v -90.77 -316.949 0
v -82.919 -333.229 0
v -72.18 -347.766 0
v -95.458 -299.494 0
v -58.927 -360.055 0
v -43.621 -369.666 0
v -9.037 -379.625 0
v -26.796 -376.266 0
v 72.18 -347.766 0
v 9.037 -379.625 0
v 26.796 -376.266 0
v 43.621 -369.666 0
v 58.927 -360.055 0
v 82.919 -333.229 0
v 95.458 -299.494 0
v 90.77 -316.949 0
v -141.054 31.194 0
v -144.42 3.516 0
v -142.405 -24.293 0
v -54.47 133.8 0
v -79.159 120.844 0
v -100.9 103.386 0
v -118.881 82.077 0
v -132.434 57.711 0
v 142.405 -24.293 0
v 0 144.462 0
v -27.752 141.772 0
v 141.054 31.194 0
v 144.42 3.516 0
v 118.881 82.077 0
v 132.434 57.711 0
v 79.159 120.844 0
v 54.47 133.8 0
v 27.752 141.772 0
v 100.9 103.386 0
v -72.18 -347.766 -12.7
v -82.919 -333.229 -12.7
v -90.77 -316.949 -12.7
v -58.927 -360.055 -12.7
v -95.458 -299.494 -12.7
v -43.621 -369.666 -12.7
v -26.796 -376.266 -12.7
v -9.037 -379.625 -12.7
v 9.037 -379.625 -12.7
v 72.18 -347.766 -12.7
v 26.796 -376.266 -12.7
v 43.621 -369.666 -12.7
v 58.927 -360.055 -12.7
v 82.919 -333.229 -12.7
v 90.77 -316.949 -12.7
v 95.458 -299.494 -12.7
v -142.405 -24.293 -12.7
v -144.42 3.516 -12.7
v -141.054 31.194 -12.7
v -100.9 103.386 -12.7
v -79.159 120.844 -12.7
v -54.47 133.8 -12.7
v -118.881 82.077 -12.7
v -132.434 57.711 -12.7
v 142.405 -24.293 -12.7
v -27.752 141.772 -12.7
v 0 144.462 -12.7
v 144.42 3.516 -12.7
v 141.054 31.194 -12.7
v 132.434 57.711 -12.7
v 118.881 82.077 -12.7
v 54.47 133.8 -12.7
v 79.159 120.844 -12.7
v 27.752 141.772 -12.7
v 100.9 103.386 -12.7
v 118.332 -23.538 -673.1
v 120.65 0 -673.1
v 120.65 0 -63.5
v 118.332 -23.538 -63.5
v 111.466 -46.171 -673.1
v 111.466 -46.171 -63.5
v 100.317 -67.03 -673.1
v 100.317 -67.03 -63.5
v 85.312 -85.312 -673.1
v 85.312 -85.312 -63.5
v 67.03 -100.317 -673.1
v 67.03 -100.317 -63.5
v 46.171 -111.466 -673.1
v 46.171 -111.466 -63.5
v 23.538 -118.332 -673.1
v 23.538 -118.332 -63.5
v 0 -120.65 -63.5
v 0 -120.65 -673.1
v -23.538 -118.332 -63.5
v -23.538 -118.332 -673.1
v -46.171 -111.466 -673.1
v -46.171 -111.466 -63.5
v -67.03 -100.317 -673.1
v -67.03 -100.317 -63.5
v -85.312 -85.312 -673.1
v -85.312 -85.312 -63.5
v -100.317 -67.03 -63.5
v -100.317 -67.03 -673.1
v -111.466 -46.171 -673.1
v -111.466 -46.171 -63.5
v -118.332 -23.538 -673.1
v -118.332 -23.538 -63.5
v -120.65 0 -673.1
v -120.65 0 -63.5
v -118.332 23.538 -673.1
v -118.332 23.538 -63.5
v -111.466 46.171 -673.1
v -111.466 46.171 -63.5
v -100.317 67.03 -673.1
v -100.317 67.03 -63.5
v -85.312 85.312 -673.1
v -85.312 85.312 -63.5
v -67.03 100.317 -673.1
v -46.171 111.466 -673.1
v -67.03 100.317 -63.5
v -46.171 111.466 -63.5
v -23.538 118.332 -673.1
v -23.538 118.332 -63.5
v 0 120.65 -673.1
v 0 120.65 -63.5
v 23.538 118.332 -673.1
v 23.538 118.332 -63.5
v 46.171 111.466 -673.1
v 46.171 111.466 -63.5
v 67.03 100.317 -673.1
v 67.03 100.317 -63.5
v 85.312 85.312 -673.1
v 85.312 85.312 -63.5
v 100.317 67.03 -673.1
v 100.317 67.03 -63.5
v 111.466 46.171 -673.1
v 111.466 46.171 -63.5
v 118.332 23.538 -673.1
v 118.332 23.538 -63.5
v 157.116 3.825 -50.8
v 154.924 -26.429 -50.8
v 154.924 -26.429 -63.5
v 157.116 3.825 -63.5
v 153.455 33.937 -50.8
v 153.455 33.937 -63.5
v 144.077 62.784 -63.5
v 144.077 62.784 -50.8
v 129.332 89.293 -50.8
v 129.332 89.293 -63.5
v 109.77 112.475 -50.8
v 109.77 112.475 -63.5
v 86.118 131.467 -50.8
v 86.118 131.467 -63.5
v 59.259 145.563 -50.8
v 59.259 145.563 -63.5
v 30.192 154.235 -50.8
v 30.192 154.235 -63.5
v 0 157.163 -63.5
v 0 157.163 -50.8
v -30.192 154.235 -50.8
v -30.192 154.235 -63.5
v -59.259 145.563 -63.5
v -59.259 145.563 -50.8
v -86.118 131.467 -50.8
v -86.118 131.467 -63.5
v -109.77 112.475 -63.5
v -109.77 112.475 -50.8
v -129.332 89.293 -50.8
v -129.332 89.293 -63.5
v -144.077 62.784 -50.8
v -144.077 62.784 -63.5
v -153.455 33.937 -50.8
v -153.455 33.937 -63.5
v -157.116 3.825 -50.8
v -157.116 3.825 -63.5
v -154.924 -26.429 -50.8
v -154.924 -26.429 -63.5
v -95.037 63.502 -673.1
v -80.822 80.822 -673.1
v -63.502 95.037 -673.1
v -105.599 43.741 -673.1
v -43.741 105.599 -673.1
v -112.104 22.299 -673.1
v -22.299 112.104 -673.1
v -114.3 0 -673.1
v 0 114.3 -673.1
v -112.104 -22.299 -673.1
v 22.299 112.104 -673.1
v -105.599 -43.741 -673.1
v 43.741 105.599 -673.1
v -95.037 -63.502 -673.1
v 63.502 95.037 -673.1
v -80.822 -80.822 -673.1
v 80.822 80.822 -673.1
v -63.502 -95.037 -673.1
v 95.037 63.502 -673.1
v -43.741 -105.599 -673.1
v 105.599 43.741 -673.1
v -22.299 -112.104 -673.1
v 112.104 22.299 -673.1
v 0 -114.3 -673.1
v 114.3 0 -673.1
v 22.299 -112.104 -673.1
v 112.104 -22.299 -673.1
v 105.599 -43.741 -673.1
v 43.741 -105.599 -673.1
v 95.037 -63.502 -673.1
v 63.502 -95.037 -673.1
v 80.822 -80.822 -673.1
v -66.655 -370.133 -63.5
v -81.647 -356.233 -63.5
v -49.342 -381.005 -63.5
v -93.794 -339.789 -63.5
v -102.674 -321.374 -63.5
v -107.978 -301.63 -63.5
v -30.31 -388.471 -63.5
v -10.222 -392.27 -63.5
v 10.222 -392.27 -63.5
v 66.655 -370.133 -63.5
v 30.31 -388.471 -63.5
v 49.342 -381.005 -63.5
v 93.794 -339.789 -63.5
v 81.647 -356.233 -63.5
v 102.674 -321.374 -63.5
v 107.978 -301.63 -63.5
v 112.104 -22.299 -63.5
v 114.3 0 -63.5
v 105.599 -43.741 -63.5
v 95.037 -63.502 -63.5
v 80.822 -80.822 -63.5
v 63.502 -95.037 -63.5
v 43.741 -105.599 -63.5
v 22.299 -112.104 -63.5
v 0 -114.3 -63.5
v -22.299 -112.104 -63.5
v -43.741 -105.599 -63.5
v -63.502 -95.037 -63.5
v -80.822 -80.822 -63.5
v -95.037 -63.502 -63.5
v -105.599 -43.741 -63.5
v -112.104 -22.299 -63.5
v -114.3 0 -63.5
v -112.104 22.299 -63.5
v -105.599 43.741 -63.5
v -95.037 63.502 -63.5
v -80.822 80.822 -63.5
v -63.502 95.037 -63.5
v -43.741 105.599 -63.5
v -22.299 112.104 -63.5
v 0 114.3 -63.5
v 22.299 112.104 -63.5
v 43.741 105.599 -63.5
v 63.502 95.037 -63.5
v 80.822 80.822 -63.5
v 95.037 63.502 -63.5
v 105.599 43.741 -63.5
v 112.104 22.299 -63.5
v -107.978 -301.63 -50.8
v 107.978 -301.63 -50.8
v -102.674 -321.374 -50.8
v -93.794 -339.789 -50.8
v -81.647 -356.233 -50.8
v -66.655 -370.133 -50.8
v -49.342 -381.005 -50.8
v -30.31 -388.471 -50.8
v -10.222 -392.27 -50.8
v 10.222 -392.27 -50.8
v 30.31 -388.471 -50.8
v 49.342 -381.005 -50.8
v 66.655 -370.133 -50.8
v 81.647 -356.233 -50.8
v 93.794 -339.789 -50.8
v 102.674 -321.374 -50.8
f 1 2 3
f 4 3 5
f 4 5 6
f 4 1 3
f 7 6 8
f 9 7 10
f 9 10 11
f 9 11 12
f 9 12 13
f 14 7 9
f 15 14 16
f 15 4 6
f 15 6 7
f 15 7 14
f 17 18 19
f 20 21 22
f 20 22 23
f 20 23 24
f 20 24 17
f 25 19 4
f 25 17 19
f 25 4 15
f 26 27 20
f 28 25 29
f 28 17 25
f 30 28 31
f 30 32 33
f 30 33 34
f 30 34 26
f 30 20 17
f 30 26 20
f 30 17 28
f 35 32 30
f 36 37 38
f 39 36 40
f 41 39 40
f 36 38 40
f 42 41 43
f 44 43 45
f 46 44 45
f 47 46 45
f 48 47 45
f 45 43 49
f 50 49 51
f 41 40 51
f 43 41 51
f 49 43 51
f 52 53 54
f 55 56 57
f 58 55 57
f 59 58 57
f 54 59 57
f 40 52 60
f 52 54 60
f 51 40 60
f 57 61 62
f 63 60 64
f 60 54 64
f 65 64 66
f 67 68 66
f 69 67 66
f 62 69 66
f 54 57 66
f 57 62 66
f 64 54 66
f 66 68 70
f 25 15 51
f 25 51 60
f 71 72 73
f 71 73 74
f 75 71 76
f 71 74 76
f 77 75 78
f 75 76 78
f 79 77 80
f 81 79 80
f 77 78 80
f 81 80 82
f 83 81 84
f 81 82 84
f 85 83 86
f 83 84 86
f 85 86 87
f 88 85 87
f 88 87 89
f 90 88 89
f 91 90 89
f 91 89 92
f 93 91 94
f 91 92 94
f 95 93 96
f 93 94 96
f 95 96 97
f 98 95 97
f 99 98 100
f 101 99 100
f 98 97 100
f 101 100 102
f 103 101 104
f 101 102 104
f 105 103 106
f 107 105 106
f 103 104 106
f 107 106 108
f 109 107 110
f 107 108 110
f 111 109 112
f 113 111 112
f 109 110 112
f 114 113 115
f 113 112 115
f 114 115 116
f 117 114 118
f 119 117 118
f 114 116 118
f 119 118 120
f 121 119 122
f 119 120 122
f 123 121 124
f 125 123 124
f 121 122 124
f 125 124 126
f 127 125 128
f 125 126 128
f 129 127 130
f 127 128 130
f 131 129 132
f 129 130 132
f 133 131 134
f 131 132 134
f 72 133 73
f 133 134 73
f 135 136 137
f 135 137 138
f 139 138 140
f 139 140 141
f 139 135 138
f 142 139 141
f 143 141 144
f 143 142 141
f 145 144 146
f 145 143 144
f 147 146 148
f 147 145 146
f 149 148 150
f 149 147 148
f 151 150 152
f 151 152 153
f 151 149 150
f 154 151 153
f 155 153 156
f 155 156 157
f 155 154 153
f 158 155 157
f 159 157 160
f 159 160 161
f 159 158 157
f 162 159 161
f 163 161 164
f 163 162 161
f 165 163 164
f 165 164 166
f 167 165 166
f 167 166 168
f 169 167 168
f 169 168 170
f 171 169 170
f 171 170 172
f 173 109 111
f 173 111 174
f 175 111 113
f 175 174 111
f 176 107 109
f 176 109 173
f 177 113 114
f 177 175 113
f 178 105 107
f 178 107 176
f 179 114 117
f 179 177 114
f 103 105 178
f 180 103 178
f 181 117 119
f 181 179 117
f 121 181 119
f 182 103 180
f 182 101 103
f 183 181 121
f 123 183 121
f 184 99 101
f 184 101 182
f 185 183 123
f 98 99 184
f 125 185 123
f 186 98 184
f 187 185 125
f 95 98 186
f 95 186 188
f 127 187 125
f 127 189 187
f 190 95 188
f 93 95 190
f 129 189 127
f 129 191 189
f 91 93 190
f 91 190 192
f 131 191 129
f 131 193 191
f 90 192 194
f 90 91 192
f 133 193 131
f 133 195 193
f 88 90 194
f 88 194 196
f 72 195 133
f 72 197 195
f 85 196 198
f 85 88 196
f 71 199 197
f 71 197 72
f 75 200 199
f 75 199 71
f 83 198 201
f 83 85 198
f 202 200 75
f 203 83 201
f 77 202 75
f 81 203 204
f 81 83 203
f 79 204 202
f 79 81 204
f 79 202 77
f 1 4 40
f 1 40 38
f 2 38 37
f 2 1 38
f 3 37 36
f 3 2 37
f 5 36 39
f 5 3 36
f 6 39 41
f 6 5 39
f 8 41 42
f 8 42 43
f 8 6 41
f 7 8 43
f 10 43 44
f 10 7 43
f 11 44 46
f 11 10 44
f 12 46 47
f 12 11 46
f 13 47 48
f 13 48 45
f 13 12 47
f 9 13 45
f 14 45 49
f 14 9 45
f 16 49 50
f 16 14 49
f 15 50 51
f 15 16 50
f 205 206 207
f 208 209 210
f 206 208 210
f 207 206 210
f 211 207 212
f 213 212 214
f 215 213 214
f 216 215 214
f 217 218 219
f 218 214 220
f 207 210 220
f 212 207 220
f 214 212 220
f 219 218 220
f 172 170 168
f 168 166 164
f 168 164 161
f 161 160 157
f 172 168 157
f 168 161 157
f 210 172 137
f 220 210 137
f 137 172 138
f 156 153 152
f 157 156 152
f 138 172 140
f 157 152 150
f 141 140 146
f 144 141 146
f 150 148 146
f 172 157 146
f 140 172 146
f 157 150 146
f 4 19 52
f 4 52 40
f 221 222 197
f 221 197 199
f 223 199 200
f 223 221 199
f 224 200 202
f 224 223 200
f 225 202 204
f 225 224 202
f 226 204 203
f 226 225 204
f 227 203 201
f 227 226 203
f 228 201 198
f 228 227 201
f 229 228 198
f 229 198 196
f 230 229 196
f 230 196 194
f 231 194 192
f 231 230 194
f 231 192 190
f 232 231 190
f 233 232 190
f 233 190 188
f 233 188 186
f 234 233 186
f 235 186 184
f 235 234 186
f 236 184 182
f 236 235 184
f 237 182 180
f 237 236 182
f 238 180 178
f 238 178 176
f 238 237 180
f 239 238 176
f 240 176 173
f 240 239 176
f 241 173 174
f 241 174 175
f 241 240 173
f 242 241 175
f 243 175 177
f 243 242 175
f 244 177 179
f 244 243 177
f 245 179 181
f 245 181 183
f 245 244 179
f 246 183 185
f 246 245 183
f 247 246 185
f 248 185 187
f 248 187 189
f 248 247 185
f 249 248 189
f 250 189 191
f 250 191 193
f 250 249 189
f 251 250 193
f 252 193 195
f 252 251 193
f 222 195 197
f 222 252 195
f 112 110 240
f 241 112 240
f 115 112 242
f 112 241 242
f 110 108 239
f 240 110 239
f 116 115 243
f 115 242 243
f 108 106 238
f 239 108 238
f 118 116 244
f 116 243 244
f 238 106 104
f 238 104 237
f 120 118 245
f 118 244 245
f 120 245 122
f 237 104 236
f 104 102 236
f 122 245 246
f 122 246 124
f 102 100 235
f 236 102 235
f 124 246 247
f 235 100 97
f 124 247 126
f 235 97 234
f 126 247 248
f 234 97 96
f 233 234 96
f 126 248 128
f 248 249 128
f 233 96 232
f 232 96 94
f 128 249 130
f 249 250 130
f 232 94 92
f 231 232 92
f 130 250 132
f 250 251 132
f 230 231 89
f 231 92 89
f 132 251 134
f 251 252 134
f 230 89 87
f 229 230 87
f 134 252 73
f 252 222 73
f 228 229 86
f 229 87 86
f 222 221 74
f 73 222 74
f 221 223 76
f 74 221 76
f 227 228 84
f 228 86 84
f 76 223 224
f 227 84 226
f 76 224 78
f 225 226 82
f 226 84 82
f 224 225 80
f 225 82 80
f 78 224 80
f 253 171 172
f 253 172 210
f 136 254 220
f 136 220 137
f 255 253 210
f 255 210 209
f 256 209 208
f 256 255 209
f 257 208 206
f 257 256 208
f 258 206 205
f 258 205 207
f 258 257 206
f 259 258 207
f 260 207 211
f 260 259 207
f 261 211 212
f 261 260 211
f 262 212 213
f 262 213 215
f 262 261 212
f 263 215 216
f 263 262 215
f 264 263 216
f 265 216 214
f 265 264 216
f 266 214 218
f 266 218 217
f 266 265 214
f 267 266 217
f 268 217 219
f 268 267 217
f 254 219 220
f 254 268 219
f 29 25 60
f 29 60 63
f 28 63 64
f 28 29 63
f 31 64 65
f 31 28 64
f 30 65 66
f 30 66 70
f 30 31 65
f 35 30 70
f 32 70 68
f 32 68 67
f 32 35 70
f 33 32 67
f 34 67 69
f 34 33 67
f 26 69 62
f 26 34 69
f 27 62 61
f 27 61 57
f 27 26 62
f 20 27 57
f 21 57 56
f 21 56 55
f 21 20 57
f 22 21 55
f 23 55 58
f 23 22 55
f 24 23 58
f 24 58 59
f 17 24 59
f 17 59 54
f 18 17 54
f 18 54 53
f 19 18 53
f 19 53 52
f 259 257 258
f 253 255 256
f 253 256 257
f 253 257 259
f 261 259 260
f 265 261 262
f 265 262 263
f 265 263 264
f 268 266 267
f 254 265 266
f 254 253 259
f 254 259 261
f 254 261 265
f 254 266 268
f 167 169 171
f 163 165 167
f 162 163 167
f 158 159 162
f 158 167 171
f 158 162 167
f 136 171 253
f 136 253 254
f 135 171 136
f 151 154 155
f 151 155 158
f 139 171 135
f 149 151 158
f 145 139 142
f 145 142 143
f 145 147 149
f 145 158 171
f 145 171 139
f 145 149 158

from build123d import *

# Parameters (mm, degrees)
F3_DEPTH = 12.7
F4_DEPTH = 12.7
F5_R     = 120.65
F5_R_2   = 114.3
F6_DEPTH = 609.6


with BuildPart() as f3:
    # F0 (on Top) → F3 (new body)
    with BuildSketch(Plane.XY):
        with BuildLine():
            Line((95.458483, -299.494333), (142.405277, -24.293021))
            ThreePointArc((142.405277, -24.293021), (0, 144.4625), (-142.405277, -24.293021))
            Line((-142.405277, -24.293021), (-95.458483, -299.494333))
            ThreePointArc((-95.458483, -299.494333), (0, -380.0475), (95.458483, -299.494333))
        make_face()
    extrude(amount=-F3_DEPTH)


with BuildPart() as f4:
    # F2 (on offset) → F4 (new body)
    with BuildSketch(Plane.XY.offset(-50.8)):
        with BuildLine():
            ThreePointArc((154.924423, -26.428672), (0, 157.1625), (-154.924423, -26.428672))
            Line((-154.924423, -26.428672), (-107.977628, -301.629983))
            ThreePointArc((-107.977628, -301.629983), (0, -392.7475), (107.977628, -301.629983))
            Line((107.977628, -301.629983), (154.924423, -26.428672))
        make_face()
    extrude(amount=-F4_DEPTH)


with BuildPart() as f6:
    # F5 (on face) → F6 (new body)
    with BuildSketch(Plane(origin=(0, 0, -63.5), x_dir=(1, 0, 0), z_dir=(0, 0, -1))):
        Circle(F5_R)
        Circle(F5_R_2, mode=Mode.SUBTRACT)
    extrude(amount=F6_DEPTH)


solid = Compound([f3.part, f4.part, f6.part])
